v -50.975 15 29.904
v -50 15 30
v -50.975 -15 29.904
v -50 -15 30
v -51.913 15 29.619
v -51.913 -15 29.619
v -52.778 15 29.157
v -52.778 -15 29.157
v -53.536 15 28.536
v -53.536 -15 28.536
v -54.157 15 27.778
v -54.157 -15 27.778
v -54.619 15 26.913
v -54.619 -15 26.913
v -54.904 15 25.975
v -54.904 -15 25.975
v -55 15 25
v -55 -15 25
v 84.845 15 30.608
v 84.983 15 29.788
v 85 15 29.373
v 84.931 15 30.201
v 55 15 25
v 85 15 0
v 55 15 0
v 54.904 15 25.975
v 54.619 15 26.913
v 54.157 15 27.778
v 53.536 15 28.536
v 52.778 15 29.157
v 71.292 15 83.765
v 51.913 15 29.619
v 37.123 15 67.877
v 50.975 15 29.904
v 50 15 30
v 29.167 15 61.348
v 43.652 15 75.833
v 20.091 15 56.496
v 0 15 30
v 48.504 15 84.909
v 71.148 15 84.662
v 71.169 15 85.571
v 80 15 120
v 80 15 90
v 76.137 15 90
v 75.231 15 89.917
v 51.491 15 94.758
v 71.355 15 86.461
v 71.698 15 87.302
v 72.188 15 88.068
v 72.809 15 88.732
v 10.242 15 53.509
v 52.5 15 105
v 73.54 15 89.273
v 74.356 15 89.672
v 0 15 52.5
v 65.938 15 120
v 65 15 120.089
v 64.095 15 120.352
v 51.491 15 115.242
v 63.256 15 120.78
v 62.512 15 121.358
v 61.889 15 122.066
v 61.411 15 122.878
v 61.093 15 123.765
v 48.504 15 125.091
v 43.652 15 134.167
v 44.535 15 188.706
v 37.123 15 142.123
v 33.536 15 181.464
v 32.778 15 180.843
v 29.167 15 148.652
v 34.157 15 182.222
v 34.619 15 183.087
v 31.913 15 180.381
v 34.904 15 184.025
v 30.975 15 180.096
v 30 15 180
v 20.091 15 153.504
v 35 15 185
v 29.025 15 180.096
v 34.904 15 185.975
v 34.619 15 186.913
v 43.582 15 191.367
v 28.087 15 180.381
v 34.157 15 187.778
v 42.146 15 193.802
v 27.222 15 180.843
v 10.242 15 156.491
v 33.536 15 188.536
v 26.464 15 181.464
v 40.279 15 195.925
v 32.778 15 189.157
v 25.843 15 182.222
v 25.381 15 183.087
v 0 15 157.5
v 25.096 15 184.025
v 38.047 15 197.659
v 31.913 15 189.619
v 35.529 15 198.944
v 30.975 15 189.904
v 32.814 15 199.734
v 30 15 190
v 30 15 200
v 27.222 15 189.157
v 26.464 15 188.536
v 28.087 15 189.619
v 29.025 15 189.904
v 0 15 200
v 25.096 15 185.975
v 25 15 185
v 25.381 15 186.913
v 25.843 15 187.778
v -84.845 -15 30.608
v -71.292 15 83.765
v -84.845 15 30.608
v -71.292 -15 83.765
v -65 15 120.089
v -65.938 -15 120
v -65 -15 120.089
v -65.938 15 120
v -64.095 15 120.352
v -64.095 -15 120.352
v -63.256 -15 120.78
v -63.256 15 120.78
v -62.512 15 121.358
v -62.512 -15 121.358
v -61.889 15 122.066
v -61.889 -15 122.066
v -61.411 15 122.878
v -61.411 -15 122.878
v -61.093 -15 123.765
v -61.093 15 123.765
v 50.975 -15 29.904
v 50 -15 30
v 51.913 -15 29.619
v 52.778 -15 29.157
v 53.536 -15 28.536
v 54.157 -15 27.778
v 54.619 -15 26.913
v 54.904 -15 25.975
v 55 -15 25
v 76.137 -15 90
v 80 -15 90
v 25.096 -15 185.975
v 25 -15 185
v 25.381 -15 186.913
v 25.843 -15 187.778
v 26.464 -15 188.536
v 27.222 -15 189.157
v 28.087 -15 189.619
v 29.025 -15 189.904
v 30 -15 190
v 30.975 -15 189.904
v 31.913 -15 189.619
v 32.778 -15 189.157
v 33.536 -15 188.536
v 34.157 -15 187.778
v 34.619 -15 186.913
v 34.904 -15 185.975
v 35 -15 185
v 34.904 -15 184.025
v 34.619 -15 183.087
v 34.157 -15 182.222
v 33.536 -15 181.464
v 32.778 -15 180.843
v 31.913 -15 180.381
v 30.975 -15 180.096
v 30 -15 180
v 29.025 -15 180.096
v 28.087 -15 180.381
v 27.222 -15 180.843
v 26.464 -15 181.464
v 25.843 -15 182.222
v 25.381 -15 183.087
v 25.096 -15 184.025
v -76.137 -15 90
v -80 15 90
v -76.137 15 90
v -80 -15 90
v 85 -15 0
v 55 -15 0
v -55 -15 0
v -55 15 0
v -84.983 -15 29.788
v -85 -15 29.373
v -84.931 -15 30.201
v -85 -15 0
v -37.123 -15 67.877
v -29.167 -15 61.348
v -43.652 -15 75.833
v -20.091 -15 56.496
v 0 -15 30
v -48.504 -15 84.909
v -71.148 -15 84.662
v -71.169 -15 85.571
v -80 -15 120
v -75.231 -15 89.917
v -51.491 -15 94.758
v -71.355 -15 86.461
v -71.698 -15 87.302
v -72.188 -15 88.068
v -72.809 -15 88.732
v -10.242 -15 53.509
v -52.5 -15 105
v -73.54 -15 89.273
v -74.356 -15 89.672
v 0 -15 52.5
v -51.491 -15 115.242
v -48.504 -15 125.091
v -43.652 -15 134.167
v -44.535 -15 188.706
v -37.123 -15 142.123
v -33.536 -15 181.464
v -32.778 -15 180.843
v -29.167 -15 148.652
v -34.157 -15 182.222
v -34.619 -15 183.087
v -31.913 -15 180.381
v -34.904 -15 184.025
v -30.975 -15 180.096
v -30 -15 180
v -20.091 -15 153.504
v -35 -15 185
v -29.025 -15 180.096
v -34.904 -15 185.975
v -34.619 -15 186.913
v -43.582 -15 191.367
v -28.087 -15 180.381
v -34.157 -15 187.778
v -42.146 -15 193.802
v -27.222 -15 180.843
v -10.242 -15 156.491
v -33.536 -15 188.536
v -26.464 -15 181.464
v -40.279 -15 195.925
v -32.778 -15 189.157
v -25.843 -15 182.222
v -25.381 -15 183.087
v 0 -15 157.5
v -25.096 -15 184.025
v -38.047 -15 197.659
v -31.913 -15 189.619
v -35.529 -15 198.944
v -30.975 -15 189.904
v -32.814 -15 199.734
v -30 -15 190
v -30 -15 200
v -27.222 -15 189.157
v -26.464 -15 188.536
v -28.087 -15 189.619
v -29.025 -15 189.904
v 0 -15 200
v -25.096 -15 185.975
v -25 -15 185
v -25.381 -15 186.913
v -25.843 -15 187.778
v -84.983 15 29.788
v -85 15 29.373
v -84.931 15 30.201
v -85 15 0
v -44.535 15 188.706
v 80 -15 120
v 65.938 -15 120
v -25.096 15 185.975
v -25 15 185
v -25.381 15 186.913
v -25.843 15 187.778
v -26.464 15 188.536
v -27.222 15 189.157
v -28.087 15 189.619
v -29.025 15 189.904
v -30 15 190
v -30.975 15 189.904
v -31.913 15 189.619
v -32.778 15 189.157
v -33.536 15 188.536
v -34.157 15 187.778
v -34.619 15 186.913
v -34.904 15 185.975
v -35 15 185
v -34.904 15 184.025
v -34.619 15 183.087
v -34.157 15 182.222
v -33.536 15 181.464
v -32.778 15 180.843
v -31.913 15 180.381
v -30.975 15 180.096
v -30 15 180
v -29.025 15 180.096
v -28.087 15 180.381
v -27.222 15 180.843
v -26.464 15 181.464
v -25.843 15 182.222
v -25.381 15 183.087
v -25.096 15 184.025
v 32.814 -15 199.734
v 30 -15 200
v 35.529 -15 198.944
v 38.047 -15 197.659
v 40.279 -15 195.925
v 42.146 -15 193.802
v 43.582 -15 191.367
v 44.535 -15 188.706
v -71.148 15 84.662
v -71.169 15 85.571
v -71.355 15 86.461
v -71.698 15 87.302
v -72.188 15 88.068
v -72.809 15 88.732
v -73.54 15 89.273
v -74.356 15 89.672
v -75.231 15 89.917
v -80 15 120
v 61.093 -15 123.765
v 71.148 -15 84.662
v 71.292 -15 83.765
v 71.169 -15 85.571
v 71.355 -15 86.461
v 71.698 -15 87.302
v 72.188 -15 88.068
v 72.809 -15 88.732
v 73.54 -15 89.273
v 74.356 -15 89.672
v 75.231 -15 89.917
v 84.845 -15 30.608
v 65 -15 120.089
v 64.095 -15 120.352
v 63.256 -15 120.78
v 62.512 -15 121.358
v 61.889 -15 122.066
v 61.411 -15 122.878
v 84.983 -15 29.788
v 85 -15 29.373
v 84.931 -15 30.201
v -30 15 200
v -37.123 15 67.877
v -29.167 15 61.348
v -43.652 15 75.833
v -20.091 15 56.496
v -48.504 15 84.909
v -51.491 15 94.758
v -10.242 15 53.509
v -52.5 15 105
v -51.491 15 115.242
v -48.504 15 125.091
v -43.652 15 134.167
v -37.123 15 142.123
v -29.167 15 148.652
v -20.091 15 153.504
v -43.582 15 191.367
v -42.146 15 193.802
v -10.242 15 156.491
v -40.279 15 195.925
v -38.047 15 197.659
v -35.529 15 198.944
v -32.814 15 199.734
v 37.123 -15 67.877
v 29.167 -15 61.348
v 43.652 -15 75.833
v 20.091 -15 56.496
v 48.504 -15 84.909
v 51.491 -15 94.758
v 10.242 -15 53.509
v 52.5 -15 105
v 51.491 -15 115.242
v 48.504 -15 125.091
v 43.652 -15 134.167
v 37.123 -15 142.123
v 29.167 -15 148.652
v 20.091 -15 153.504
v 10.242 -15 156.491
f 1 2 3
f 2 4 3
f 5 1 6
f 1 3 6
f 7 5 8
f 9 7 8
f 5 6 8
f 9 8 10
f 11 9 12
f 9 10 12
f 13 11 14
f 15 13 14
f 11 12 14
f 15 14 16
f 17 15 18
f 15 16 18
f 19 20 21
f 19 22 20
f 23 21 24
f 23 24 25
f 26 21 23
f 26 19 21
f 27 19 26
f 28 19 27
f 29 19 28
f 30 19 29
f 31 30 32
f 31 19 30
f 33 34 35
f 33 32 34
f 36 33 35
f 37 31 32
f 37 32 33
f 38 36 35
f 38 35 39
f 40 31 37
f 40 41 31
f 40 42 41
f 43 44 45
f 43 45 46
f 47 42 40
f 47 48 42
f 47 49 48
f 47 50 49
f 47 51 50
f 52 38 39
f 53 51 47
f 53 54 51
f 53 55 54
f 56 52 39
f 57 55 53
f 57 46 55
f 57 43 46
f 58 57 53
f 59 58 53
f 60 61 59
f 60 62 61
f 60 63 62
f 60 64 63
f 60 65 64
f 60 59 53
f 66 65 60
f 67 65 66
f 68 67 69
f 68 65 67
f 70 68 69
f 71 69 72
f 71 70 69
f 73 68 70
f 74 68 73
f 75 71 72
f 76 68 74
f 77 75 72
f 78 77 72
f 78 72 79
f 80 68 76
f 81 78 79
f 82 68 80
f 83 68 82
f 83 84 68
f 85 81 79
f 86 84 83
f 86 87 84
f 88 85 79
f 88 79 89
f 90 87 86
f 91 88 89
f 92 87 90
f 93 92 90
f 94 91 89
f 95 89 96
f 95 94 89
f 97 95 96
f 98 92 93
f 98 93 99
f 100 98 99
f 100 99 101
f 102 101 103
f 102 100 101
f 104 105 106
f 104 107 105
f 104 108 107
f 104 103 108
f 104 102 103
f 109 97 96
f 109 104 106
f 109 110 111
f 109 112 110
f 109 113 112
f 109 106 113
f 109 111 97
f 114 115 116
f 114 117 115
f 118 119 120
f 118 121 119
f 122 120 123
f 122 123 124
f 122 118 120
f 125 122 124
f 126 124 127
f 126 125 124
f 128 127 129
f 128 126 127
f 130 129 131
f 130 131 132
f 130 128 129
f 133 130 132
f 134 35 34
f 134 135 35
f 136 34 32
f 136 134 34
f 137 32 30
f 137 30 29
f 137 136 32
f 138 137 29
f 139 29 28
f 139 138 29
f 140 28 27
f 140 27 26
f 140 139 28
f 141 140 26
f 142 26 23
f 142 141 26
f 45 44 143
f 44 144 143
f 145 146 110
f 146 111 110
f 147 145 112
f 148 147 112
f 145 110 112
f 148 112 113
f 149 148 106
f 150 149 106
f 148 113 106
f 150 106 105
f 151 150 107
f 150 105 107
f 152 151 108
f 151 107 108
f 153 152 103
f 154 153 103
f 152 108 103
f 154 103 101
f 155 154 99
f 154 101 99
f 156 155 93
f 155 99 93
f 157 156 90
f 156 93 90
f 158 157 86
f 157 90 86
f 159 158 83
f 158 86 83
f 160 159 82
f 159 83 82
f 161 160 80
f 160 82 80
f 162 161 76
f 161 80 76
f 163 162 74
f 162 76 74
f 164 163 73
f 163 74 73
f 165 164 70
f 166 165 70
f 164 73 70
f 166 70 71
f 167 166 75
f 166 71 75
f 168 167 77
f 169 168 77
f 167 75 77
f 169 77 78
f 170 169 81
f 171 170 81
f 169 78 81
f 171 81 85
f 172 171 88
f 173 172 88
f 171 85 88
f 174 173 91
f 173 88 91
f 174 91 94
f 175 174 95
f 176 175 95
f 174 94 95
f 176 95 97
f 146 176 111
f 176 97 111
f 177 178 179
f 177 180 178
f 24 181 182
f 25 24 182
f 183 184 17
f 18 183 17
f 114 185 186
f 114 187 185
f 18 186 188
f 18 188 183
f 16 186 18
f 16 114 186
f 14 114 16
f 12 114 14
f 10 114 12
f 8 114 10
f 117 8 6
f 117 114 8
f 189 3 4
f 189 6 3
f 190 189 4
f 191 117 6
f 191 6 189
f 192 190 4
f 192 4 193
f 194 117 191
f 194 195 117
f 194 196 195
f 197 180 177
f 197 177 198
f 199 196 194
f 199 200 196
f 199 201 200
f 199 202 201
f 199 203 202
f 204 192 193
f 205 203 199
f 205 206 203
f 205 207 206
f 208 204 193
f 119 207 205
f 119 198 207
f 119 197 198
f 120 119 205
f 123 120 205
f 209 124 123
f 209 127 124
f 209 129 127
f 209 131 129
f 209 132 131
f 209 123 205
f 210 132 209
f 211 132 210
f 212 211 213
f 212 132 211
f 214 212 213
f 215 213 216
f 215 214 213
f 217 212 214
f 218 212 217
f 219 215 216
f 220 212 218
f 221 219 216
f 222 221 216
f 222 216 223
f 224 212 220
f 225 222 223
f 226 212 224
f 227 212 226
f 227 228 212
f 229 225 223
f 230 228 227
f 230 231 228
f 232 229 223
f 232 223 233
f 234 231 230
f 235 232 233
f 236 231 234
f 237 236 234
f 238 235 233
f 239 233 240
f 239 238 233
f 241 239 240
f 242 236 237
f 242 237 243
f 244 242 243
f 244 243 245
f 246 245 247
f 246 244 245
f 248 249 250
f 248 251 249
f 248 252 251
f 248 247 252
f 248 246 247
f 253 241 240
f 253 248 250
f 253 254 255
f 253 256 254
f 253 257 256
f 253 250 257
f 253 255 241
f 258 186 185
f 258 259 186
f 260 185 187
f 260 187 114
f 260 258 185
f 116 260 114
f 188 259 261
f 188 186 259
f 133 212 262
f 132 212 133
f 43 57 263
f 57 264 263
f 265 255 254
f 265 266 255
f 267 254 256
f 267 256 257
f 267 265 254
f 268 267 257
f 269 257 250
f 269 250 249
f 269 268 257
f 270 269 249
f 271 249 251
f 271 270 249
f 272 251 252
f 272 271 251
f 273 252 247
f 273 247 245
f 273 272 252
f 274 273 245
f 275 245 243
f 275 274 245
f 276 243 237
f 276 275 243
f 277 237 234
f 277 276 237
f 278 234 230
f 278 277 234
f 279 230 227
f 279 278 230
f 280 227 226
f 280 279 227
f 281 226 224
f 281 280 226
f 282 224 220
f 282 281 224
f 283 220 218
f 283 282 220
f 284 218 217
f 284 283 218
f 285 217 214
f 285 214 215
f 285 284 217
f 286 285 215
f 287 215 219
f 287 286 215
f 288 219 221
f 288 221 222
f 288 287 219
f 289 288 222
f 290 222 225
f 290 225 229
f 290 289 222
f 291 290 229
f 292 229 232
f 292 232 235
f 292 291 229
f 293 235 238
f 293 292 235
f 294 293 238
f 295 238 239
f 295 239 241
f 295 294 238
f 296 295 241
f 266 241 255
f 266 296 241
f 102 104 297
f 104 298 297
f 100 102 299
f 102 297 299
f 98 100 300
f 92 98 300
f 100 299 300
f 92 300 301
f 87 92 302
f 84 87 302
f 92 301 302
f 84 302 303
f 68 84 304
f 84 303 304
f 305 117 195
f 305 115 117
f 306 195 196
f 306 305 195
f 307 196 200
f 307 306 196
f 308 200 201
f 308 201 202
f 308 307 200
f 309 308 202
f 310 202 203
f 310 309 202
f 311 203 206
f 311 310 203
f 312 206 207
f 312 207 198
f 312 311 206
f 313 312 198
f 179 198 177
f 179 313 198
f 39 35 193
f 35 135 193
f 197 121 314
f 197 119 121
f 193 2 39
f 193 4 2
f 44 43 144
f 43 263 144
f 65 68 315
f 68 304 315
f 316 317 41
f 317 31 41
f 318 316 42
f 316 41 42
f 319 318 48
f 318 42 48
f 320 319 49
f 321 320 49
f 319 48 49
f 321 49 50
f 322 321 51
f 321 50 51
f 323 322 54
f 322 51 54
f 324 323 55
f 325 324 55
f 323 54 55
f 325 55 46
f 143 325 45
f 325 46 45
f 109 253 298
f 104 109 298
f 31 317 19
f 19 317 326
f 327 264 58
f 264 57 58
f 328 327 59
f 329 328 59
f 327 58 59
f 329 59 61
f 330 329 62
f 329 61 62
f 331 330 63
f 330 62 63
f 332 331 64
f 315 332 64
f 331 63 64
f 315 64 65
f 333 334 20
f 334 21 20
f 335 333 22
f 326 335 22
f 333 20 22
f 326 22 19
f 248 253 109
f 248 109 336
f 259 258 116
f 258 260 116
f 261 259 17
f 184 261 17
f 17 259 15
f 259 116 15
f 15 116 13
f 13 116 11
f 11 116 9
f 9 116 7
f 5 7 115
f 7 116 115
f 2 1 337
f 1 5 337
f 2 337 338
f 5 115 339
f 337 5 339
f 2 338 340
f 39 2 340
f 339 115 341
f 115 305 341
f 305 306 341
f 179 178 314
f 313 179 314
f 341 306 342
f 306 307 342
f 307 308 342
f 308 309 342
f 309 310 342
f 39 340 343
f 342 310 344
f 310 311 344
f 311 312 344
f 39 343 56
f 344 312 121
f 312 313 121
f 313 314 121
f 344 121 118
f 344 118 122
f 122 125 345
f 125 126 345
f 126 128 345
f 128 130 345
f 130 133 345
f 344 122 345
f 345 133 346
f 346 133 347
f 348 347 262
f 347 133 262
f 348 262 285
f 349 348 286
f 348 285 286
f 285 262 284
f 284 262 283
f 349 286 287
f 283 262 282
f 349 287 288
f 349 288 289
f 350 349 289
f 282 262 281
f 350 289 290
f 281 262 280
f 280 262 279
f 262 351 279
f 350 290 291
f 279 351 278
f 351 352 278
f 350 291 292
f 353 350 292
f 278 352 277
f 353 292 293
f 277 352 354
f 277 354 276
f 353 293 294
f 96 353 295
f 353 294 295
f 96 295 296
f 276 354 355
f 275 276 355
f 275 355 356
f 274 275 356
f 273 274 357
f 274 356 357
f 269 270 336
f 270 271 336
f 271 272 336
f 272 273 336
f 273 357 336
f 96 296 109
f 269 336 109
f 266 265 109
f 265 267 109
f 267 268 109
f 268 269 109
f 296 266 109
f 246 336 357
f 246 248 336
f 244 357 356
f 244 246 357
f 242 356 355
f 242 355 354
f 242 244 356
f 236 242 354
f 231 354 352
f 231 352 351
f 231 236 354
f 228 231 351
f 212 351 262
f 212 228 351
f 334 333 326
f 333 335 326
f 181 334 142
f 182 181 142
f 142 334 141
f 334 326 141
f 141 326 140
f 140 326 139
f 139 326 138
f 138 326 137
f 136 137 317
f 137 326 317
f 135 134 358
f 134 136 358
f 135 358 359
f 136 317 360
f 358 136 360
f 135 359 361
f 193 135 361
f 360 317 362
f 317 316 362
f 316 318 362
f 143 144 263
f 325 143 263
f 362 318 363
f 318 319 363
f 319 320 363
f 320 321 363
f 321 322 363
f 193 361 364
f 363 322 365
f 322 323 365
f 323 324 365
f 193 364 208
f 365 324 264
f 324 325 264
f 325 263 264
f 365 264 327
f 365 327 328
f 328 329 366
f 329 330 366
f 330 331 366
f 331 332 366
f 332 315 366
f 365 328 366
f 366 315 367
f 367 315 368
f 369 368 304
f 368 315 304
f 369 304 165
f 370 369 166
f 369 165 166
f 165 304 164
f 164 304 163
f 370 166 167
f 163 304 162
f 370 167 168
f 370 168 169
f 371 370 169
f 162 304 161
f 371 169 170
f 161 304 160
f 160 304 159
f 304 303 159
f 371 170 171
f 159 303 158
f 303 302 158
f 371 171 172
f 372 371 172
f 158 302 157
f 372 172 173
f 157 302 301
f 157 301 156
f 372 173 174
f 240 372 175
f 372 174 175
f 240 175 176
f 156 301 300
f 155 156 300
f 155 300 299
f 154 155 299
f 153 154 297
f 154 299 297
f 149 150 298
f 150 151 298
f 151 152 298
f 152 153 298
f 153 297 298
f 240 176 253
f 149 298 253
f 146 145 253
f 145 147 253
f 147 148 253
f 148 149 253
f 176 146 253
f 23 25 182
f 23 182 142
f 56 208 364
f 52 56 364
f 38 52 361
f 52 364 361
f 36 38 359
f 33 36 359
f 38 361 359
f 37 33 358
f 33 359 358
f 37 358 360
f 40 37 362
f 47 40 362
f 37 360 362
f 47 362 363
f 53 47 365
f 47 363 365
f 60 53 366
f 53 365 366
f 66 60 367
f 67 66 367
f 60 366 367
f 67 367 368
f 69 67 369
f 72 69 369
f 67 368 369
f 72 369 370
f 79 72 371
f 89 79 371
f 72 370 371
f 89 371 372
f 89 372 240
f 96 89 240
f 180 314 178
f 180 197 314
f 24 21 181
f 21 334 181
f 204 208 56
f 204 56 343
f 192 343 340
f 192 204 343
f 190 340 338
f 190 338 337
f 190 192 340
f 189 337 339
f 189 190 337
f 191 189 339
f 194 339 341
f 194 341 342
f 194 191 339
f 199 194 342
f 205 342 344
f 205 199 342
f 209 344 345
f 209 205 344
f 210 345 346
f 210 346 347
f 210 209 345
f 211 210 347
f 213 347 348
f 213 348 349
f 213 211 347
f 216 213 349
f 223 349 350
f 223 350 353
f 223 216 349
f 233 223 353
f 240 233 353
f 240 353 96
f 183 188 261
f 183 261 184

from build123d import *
from build123d import SkipClean  # not in build123d's __all__

# Parameters (mm, degrees)
F0_R     = 5
F1_DEPTH = 15
F2_R     = 5


with BuildPart() as f1:
    # F0 (on Front) → F1 (new body, symmetric)
    with BuildSketch(Plane.XZ):
        with BuildLine():
            Line((-85, 30), (-85, 0))
            Line((-85, 0), (-55, 0))
            Line((-55, 0), (-55, 30))
            Line((-55, 30), (0, 30))
            Line((0, 30), (0, 52.5))
            ThreePointArc((0, 52.5), (-52.5, 105), (0, 157.5))
            Line((0, 157.5), (0, 200))
            Line((0, 200), (-30, 200))
            ThreePointArc((-30, 200), (-39.2035469986, 196.8446073234), (-44.5349866907, 188.7059630193))
            Line((-44.5349866907, 188.7059630193), (-62.0528395496, 120))
            Line((-62.0528395496, 120), (-80, 120))
            Line((-80, 120), (-80, 90))
            Line((-80, 90), (-69.7018930331, 90))
            Line((-69.7018930331, 90), (-85, 30))
        make_face()
        with Locations((-30, 185)):
            Circle(F0_R, mode=Mode.SUBTRACT)
    extrude(amount=F1_DEPTH, both=True)

    # F2
    f2_edges = [f1.edges().sort_by_distance(p)[0] for p in [
        (-69.701893, 0, 90),
        (-62.05284, 0, 120),
        (-85, 0, 30),
        (-55, 0, 30),
    ]]
    fillet(f2_edges, radius=F2_R)

    # F3: F1 across plane


with BuildPart() as f1_1:
    add(f1.part, clean=False)
    with SkipClean():  # cleaning this boolean's faces spoils the solid; the shape is the same uncleaned
        add(f1.part.mirror(Plane.YZ), clean=False)


solid = f1_1.part
